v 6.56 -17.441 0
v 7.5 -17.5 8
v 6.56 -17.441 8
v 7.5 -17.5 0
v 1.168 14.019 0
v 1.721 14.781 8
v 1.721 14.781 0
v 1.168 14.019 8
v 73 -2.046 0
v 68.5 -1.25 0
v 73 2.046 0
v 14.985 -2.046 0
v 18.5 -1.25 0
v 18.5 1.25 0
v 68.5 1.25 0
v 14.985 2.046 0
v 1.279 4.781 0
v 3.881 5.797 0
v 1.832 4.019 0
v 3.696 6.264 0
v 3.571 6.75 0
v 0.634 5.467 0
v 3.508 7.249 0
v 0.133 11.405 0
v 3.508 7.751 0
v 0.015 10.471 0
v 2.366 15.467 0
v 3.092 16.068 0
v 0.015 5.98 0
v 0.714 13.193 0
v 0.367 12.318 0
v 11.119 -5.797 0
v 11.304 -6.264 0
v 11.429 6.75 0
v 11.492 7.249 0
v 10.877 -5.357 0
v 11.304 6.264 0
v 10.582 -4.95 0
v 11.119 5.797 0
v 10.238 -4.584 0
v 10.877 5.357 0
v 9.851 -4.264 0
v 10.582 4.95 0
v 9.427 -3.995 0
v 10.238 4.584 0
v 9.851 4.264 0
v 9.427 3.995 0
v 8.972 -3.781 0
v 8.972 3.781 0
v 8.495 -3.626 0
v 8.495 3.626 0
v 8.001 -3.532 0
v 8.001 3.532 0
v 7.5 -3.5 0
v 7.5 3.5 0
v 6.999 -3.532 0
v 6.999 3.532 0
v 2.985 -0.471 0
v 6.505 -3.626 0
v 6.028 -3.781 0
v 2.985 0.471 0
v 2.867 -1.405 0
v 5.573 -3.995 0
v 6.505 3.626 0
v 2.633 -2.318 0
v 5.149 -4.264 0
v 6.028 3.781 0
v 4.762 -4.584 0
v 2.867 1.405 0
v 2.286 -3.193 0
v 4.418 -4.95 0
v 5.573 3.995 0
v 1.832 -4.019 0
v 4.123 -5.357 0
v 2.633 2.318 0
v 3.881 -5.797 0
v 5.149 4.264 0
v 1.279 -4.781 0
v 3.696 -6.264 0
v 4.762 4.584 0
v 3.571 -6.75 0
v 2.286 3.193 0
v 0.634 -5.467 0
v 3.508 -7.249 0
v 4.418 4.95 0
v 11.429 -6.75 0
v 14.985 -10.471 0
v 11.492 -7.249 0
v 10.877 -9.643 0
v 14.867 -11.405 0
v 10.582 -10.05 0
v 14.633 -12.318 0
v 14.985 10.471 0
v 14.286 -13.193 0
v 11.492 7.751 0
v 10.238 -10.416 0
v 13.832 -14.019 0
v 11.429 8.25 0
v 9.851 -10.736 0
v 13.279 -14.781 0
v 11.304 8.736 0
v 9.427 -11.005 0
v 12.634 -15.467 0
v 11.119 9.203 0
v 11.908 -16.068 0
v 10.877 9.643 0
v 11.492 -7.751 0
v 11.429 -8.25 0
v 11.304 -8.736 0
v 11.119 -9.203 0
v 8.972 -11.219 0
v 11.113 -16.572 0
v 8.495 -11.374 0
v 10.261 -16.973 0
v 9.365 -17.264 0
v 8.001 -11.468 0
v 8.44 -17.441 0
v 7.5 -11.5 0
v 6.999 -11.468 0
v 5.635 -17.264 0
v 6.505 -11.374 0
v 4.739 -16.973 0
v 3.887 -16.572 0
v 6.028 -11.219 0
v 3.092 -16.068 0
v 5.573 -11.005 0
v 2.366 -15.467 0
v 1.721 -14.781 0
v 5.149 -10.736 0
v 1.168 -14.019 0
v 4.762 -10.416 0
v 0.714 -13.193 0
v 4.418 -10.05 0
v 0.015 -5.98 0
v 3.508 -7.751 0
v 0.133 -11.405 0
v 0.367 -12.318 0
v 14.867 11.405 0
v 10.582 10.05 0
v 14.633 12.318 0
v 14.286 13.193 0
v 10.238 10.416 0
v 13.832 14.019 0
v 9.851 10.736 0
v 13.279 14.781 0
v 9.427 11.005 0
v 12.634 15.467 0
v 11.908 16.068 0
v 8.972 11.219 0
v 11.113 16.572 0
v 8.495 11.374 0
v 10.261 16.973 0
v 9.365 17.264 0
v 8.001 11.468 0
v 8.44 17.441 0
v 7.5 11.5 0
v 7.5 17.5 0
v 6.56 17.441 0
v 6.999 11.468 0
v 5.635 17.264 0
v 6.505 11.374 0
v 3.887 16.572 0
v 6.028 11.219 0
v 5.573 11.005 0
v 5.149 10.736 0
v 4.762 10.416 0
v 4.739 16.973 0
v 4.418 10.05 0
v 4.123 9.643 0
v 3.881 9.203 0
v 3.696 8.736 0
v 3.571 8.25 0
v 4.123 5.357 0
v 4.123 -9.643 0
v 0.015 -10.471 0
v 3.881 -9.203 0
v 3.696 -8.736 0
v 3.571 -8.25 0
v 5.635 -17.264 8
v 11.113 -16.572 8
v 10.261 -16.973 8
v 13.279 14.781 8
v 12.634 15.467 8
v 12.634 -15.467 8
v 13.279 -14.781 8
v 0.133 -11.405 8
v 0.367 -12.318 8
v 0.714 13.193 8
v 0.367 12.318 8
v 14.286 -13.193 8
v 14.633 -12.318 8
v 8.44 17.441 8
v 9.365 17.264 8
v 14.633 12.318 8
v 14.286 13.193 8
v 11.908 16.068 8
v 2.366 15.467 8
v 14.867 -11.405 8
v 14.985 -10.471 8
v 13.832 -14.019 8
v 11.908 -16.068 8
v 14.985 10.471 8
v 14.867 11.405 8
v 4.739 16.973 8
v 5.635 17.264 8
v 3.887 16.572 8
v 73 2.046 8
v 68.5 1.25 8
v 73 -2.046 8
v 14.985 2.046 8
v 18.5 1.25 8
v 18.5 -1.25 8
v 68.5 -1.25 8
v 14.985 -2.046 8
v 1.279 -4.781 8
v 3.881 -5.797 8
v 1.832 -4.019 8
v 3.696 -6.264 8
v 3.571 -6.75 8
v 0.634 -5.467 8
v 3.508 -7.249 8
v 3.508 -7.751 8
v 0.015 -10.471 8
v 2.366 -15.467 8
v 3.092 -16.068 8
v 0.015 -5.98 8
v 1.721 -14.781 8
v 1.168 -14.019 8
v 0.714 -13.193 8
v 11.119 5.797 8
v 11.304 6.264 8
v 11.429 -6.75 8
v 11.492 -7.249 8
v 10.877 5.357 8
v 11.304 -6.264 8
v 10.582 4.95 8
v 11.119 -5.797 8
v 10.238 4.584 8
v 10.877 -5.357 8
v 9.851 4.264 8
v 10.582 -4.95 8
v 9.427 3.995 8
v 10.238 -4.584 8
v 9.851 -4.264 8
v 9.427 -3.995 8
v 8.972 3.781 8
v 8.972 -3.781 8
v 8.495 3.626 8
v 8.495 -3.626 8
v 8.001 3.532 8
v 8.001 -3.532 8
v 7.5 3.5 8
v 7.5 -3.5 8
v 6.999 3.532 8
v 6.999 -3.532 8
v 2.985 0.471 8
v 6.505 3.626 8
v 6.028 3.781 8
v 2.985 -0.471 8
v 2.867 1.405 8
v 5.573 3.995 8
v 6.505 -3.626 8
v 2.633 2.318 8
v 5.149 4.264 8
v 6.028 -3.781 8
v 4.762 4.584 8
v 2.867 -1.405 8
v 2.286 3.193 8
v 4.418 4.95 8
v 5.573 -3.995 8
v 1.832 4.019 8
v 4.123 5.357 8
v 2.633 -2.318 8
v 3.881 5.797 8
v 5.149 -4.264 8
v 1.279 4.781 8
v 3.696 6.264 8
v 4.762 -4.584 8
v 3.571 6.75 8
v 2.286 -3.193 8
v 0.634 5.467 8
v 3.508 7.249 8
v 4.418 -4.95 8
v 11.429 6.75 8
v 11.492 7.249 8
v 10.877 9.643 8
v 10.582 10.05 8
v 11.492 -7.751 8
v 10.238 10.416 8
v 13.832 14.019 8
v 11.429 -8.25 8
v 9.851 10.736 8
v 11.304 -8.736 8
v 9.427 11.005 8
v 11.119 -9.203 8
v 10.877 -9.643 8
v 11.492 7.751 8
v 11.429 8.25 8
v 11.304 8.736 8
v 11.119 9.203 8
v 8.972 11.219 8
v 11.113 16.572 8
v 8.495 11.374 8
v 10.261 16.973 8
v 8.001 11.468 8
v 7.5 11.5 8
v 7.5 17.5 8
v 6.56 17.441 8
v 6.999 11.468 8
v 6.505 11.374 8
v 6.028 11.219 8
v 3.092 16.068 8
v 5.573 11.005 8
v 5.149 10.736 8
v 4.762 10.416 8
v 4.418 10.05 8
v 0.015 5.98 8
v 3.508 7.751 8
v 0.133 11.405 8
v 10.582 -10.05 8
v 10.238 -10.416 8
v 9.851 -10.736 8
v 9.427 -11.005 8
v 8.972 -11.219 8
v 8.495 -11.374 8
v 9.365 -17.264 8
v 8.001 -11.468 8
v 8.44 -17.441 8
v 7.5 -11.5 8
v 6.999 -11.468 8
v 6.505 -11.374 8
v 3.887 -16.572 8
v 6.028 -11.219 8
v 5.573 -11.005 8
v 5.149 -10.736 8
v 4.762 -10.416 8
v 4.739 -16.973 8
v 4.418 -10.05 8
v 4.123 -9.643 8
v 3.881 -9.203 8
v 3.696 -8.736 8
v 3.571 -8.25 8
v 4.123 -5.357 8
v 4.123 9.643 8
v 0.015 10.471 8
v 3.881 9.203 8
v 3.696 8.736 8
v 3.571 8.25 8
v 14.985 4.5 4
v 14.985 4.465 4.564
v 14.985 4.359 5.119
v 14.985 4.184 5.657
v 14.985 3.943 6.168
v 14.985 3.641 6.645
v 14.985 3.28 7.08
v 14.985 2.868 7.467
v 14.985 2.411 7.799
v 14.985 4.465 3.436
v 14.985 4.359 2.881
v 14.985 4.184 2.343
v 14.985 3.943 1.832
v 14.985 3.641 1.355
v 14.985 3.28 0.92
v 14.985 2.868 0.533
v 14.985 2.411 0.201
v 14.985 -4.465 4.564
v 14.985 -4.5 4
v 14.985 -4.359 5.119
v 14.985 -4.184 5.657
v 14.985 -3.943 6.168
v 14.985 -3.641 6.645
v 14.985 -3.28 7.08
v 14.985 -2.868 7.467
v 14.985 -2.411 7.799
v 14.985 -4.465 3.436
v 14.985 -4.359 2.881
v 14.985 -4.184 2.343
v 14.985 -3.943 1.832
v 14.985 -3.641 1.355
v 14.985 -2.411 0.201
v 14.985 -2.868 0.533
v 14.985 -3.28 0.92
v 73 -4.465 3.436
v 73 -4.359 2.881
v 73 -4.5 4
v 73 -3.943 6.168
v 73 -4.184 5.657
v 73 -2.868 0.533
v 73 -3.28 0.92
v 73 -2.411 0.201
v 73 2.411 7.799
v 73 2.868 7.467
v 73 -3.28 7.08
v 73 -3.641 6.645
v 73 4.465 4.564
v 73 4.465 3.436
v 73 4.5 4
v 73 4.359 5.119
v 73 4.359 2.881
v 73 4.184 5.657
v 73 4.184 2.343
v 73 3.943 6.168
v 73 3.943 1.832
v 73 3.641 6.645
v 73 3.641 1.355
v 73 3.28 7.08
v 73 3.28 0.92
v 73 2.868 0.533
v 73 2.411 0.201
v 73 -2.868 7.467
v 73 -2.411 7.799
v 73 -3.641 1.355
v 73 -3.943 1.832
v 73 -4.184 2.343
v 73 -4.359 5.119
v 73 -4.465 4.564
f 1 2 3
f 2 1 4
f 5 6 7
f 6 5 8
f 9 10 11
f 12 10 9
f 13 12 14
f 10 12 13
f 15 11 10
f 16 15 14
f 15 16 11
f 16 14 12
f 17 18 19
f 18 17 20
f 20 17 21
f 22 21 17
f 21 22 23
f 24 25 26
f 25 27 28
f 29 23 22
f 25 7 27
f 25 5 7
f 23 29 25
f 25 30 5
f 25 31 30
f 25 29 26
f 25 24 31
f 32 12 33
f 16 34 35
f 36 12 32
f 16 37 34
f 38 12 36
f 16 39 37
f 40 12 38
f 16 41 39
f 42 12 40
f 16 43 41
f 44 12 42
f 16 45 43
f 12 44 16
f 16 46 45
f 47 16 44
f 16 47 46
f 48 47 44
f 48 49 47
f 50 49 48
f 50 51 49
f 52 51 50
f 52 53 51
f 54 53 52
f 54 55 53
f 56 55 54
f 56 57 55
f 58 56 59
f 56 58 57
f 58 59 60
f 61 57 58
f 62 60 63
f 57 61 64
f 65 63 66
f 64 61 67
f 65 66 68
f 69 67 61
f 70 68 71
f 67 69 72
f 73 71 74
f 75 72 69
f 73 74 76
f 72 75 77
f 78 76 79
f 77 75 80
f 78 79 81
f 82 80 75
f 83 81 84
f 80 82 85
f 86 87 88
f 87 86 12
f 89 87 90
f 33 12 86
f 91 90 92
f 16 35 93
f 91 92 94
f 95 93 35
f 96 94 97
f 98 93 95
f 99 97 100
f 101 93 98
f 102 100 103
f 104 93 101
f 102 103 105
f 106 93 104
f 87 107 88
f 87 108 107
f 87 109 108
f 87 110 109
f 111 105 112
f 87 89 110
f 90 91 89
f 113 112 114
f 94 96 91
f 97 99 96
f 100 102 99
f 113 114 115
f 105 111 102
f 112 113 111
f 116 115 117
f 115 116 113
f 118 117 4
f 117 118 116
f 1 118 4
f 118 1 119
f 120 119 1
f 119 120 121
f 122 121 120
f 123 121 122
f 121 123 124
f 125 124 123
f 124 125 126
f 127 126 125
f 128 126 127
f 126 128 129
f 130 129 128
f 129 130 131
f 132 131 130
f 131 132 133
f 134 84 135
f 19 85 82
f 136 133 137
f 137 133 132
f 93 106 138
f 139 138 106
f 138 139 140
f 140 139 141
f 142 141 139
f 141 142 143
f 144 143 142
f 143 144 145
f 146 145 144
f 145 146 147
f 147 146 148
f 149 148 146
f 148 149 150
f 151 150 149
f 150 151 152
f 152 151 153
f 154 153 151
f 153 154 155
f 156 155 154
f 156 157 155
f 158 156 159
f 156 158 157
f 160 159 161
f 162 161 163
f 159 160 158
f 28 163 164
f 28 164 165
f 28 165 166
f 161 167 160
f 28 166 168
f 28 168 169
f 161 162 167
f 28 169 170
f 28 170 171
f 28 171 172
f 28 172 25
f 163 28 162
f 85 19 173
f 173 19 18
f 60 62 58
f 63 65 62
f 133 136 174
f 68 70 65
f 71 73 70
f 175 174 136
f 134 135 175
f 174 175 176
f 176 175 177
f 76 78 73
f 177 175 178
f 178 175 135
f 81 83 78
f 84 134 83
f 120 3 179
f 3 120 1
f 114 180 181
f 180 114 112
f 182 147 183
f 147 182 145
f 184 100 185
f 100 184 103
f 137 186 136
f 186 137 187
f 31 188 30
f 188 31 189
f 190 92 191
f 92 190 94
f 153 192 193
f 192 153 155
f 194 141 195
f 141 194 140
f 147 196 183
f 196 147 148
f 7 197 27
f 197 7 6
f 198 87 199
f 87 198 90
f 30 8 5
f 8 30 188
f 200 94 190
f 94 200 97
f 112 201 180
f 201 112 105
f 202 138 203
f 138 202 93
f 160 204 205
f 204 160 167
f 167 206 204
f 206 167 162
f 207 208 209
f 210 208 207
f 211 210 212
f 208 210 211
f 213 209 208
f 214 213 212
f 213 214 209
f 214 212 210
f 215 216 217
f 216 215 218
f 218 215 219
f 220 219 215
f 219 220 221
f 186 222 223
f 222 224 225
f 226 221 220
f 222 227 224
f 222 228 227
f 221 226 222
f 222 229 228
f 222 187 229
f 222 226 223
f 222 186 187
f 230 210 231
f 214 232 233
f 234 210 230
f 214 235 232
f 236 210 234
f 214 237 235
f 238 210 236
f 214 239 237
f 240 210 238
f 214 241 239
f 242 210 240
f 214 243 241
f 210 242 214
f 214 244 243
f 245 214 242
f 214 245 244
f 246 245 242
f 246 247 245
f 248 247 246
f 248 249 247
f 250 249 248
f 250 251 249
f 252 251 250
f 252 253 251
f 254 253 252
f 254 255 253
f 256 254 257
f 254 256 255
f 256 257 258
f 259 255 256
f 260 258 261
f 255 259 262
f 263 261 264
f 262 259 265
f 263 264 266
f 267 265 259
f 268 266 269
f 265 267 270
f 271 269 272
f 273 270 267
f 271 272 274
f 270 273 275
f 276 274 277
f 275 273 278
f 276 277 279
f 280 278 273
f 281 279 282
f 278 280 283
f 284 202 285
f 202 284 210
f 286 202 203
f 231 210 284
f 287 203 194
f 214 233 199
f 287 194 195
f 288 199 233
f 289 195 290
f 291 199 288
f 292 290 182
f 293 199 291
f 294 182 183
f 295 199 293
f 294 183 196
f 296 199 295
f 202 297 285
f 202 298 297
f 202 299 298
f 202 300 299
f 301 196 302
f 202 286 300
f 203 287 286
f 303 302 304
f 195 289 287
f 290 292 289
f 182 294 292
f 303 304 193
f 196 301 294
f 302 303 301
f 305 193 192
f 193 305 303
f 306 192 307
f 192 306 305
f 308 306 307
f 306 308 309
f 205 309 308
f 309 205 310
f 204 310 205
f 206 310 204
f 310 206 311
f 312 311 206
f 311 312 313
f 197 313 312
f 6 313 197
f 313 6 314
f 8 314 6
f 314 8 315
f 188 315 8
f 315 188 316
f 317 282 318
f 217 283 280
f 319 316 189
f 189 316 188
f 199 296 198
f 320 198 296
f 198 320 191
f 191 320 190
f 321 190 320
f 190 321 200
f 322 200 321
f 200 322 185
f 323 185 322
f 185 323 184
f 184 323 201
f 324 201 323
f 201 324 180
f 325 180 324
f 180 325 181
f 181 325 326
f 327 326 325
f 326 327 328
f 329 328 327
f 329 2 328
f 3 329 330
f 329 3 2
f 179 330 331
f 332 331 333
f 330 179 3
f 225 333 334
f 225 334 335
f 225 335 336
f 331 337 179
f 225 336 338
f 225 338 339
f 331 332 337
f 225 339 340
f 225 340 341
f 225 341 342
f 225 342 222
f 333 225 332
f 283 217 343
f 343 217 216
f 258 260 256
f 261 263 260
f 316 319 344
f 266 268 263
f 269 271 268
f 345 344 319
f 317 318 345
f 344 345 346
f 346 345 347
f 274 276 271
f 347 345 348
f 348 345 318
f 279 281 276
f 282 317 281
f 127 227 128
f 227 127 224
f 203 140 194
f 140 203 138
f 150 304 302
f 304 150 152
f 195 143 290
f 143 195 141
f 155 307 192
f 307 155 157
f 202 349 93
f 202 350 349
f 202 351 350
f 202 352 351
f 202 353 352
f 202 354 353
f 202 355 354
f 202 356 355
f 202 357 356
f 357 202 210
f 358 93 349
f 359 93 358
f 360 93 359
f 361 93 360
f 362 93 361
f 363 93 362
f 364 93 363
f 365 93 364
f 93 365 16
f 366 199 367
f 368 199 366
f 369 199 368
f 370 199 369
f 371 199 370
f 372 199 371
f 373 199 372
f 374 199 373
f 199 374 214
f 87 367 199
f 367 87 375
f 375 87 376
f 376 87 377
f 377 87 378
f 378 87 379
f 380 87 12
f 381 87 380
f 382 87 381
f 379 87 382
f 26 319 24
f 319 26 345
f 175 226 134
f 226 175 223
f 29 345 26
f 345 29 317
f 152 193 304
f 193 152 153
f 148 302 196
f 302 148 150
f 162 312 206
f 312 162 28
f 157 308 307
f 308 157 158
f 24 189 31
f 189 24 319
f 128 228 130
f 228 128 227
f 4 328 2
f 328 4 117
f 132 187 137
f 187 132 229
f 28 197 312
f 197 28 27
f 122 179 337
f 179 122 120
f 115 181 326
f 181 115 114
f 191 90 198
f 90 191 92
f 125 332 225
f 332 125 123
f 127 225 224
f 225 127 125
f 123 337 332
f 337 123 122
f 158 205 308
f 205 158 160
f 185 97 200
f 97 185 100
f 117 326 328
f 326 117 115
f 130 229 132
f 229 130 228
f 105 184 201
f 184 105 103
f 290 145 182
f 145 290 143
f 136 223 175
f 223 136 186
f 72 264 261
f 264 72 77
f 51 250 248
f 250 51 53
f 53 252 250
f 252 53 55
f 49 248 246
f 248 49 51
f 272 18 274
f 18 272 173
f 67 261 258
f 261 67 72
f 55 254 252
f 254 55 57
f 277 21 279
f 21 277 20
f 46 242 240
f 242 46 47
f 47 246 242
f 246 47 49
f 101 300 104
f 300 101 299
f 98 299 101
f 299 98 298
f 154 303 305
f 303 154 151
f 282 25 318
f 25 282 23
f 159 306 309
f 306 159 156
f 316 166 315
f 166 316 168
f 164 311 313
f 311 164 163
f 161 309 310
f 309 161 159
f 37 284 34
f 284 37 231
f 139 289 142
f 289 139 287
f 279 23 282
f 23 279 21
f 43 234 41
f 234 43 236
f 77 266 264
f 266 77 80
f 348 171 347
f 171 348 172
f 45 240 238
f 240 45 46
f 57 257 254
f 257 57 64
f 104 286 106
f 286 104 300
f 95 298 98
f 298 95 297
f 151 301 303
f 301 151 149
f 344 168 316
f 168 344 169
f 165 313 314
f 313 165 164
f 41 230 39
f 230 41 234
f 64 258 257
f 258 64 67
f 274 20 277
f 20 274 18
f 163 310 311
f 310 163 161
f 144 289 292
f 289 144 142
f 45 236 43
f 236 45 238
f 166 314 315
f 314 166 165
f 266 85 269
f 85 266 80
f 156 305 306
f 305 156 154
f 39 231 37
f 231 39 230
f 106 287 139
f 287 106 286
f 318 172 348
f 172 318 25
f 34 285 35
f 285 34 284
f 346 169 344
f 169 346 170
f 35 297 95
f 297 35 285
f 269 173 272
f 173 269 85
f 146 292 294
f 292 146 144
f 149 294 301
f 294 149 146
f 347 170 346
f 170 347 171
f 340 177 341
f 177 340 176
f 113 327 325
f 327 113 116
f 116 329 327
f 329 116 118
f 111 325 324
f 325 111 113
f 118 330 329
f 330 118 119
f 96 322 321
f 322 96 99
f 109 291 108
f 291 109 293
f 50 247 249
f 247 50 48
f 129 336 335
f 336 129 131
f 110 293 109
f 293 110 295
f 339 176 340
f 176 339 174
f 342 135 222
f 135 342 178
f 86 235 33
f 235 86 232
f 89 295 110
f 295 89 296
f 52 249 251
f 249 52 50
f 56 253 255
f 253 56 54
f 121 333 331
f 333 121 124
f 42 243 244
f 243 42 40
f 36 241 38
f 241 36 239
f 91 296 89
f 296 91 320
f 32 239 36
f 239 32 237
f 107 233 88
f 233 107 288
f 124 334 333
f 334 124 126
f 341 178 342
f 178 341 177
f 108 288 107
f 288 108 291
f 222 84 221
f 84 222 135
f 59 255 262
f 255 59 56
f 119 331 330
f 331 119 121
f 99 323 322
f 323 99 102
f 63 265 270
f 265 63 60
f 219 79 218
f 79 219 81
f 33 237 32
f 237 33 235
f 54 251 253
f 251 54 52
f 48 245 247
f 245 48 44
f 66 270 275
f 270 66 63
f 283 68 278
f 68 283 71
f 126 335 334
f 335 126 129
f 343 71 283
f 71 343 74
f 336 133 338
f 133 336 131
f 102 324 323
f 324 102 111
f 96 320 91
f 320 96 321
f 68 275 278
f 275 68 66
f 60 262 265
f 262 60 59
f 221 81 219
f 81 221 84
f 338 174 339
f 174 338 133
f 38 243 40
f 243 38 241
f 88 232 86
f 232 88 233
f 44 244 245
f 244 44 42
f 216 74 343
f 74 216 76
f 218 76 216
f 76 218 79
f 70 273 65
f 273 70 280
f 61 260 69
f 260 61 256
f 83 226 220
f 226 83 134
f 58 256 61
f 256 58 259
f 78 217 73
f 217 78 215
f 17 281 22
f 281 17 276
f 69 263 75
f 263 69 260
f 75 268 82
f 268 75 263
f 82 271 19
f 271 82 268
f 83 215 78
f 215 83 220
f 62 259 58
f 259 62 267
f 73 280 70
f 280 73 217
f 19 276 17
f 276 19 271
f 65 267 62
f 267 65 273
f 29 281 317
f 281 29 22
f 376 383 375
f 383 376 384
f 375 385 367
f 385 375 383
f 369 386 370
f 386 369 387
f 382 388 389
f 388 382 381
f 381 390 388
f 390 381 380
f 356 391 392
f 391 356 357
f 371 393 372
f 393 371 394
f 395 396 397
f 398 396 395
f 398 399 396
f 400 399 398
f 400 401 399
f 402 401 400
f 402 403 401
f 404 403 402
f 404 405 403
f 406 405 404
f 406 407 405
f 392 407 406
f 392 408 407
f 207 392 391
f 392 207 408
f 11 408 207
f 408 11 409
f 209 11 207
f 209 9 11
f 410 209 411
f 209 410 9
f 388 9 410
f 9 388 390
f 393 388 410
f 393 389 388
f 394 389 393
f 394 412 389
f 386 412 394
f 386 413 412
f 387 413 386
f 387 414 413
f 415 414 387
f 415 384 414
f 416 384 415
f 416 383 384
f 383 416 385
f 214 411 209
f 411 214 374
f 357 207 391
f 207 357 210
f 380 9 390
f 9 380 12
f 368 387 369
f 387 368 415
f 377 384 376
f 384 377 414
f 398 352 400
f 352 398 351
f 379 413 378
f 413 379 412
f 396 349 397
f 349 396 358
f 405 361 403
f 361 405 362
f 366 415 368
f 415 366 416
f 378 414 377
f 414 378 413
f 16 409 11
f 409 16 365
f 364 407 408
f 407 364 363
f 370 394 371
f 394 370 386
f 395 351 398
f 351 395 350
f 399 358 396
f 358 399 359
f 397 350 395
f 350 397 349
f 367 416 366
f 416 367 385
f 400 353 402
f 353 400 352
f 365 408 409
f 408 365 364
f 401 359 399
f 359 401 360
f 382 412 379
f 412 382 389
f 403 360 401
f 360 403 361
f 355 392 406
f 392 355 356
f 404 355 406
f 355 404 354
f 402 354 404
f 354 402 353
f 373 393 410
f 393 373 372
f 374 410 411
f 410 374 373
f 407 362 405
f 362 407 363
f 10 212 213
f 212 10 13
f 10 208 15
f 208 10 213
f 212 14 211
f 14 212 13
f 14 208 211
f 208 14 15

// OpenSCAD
//////
// Tooth-paste/Paint Tube Key
//
// http://www.thingiverse.com/thing:21410
// By: Alan Yates <thingiverse@alanyates.com>
//////

// geometry
barrel_diameter = 9.0;
barrel_flats = 8.0;
slot_width = 2.5;
slot_length = 50.0;
key_width = 35.0;
key_height = 15.0;
hole_diameter = 8;

// tolerances
overlap = 1;
$fn = 50;

translate([0, 0, barrel_flats/2])
	rotate(-90, [0, 0, 1]) rotate(-90, [1, 0, 0])
		tube_key(barrel_diameter, barrel_flats, slot_width, slot_length, key_width, key_height, hole_diameter);

module tube_key(bd, bf, sw, sl, kw, kh, hd) {
	union() {
		translate([0, 0, kh/2])
			rotate(90, [1, 0, 0]) {
				difference() {
					hull() {
						translate([kw/2 - kh/2, 0, 0])
							cylinder(r = kh/2, h = bf, center = true);
						translate([- kw/2 + kh/2, 0, 0])
							cylinder(r = kh/2, h = bf, center = true);
					}
#					translate([-kh/2, 0, -bf/2-overlap])
						cylinder(r = hd/2, h = bf + 2*overlap);
#					translate([kh/2, 0, -bf/2-overlap])
						cylinder(r = hd/2, h = bf + 2*overlap);
#					translate([0, -4*kh/5, -bf/2-overlap])
						cylinder(r = kh/2, h = bf + 2*overlap);
				}
			}
		translate([0, 0, kh - overlap])
			difference() {
				cylinder(r = bd/2, h = sl + bd);
		
#				translate([-sw/2, -bd/2 - overlap, bd/2])
					cube([sw, bd + 2*overlap, sl]);
#				translate([-bd/2 - overlap, bf/2, -overlap])
					cube([bd + 2*overlap, bd/2, sl + bd + 2*overlap]);
#				translate([-bd/2 - overlap, -bf/2 - bd/2, -overlap])
					cube([bd + 2*overlap, bd/2, sl + bd + 2*overlap]);
			}
	}
}
